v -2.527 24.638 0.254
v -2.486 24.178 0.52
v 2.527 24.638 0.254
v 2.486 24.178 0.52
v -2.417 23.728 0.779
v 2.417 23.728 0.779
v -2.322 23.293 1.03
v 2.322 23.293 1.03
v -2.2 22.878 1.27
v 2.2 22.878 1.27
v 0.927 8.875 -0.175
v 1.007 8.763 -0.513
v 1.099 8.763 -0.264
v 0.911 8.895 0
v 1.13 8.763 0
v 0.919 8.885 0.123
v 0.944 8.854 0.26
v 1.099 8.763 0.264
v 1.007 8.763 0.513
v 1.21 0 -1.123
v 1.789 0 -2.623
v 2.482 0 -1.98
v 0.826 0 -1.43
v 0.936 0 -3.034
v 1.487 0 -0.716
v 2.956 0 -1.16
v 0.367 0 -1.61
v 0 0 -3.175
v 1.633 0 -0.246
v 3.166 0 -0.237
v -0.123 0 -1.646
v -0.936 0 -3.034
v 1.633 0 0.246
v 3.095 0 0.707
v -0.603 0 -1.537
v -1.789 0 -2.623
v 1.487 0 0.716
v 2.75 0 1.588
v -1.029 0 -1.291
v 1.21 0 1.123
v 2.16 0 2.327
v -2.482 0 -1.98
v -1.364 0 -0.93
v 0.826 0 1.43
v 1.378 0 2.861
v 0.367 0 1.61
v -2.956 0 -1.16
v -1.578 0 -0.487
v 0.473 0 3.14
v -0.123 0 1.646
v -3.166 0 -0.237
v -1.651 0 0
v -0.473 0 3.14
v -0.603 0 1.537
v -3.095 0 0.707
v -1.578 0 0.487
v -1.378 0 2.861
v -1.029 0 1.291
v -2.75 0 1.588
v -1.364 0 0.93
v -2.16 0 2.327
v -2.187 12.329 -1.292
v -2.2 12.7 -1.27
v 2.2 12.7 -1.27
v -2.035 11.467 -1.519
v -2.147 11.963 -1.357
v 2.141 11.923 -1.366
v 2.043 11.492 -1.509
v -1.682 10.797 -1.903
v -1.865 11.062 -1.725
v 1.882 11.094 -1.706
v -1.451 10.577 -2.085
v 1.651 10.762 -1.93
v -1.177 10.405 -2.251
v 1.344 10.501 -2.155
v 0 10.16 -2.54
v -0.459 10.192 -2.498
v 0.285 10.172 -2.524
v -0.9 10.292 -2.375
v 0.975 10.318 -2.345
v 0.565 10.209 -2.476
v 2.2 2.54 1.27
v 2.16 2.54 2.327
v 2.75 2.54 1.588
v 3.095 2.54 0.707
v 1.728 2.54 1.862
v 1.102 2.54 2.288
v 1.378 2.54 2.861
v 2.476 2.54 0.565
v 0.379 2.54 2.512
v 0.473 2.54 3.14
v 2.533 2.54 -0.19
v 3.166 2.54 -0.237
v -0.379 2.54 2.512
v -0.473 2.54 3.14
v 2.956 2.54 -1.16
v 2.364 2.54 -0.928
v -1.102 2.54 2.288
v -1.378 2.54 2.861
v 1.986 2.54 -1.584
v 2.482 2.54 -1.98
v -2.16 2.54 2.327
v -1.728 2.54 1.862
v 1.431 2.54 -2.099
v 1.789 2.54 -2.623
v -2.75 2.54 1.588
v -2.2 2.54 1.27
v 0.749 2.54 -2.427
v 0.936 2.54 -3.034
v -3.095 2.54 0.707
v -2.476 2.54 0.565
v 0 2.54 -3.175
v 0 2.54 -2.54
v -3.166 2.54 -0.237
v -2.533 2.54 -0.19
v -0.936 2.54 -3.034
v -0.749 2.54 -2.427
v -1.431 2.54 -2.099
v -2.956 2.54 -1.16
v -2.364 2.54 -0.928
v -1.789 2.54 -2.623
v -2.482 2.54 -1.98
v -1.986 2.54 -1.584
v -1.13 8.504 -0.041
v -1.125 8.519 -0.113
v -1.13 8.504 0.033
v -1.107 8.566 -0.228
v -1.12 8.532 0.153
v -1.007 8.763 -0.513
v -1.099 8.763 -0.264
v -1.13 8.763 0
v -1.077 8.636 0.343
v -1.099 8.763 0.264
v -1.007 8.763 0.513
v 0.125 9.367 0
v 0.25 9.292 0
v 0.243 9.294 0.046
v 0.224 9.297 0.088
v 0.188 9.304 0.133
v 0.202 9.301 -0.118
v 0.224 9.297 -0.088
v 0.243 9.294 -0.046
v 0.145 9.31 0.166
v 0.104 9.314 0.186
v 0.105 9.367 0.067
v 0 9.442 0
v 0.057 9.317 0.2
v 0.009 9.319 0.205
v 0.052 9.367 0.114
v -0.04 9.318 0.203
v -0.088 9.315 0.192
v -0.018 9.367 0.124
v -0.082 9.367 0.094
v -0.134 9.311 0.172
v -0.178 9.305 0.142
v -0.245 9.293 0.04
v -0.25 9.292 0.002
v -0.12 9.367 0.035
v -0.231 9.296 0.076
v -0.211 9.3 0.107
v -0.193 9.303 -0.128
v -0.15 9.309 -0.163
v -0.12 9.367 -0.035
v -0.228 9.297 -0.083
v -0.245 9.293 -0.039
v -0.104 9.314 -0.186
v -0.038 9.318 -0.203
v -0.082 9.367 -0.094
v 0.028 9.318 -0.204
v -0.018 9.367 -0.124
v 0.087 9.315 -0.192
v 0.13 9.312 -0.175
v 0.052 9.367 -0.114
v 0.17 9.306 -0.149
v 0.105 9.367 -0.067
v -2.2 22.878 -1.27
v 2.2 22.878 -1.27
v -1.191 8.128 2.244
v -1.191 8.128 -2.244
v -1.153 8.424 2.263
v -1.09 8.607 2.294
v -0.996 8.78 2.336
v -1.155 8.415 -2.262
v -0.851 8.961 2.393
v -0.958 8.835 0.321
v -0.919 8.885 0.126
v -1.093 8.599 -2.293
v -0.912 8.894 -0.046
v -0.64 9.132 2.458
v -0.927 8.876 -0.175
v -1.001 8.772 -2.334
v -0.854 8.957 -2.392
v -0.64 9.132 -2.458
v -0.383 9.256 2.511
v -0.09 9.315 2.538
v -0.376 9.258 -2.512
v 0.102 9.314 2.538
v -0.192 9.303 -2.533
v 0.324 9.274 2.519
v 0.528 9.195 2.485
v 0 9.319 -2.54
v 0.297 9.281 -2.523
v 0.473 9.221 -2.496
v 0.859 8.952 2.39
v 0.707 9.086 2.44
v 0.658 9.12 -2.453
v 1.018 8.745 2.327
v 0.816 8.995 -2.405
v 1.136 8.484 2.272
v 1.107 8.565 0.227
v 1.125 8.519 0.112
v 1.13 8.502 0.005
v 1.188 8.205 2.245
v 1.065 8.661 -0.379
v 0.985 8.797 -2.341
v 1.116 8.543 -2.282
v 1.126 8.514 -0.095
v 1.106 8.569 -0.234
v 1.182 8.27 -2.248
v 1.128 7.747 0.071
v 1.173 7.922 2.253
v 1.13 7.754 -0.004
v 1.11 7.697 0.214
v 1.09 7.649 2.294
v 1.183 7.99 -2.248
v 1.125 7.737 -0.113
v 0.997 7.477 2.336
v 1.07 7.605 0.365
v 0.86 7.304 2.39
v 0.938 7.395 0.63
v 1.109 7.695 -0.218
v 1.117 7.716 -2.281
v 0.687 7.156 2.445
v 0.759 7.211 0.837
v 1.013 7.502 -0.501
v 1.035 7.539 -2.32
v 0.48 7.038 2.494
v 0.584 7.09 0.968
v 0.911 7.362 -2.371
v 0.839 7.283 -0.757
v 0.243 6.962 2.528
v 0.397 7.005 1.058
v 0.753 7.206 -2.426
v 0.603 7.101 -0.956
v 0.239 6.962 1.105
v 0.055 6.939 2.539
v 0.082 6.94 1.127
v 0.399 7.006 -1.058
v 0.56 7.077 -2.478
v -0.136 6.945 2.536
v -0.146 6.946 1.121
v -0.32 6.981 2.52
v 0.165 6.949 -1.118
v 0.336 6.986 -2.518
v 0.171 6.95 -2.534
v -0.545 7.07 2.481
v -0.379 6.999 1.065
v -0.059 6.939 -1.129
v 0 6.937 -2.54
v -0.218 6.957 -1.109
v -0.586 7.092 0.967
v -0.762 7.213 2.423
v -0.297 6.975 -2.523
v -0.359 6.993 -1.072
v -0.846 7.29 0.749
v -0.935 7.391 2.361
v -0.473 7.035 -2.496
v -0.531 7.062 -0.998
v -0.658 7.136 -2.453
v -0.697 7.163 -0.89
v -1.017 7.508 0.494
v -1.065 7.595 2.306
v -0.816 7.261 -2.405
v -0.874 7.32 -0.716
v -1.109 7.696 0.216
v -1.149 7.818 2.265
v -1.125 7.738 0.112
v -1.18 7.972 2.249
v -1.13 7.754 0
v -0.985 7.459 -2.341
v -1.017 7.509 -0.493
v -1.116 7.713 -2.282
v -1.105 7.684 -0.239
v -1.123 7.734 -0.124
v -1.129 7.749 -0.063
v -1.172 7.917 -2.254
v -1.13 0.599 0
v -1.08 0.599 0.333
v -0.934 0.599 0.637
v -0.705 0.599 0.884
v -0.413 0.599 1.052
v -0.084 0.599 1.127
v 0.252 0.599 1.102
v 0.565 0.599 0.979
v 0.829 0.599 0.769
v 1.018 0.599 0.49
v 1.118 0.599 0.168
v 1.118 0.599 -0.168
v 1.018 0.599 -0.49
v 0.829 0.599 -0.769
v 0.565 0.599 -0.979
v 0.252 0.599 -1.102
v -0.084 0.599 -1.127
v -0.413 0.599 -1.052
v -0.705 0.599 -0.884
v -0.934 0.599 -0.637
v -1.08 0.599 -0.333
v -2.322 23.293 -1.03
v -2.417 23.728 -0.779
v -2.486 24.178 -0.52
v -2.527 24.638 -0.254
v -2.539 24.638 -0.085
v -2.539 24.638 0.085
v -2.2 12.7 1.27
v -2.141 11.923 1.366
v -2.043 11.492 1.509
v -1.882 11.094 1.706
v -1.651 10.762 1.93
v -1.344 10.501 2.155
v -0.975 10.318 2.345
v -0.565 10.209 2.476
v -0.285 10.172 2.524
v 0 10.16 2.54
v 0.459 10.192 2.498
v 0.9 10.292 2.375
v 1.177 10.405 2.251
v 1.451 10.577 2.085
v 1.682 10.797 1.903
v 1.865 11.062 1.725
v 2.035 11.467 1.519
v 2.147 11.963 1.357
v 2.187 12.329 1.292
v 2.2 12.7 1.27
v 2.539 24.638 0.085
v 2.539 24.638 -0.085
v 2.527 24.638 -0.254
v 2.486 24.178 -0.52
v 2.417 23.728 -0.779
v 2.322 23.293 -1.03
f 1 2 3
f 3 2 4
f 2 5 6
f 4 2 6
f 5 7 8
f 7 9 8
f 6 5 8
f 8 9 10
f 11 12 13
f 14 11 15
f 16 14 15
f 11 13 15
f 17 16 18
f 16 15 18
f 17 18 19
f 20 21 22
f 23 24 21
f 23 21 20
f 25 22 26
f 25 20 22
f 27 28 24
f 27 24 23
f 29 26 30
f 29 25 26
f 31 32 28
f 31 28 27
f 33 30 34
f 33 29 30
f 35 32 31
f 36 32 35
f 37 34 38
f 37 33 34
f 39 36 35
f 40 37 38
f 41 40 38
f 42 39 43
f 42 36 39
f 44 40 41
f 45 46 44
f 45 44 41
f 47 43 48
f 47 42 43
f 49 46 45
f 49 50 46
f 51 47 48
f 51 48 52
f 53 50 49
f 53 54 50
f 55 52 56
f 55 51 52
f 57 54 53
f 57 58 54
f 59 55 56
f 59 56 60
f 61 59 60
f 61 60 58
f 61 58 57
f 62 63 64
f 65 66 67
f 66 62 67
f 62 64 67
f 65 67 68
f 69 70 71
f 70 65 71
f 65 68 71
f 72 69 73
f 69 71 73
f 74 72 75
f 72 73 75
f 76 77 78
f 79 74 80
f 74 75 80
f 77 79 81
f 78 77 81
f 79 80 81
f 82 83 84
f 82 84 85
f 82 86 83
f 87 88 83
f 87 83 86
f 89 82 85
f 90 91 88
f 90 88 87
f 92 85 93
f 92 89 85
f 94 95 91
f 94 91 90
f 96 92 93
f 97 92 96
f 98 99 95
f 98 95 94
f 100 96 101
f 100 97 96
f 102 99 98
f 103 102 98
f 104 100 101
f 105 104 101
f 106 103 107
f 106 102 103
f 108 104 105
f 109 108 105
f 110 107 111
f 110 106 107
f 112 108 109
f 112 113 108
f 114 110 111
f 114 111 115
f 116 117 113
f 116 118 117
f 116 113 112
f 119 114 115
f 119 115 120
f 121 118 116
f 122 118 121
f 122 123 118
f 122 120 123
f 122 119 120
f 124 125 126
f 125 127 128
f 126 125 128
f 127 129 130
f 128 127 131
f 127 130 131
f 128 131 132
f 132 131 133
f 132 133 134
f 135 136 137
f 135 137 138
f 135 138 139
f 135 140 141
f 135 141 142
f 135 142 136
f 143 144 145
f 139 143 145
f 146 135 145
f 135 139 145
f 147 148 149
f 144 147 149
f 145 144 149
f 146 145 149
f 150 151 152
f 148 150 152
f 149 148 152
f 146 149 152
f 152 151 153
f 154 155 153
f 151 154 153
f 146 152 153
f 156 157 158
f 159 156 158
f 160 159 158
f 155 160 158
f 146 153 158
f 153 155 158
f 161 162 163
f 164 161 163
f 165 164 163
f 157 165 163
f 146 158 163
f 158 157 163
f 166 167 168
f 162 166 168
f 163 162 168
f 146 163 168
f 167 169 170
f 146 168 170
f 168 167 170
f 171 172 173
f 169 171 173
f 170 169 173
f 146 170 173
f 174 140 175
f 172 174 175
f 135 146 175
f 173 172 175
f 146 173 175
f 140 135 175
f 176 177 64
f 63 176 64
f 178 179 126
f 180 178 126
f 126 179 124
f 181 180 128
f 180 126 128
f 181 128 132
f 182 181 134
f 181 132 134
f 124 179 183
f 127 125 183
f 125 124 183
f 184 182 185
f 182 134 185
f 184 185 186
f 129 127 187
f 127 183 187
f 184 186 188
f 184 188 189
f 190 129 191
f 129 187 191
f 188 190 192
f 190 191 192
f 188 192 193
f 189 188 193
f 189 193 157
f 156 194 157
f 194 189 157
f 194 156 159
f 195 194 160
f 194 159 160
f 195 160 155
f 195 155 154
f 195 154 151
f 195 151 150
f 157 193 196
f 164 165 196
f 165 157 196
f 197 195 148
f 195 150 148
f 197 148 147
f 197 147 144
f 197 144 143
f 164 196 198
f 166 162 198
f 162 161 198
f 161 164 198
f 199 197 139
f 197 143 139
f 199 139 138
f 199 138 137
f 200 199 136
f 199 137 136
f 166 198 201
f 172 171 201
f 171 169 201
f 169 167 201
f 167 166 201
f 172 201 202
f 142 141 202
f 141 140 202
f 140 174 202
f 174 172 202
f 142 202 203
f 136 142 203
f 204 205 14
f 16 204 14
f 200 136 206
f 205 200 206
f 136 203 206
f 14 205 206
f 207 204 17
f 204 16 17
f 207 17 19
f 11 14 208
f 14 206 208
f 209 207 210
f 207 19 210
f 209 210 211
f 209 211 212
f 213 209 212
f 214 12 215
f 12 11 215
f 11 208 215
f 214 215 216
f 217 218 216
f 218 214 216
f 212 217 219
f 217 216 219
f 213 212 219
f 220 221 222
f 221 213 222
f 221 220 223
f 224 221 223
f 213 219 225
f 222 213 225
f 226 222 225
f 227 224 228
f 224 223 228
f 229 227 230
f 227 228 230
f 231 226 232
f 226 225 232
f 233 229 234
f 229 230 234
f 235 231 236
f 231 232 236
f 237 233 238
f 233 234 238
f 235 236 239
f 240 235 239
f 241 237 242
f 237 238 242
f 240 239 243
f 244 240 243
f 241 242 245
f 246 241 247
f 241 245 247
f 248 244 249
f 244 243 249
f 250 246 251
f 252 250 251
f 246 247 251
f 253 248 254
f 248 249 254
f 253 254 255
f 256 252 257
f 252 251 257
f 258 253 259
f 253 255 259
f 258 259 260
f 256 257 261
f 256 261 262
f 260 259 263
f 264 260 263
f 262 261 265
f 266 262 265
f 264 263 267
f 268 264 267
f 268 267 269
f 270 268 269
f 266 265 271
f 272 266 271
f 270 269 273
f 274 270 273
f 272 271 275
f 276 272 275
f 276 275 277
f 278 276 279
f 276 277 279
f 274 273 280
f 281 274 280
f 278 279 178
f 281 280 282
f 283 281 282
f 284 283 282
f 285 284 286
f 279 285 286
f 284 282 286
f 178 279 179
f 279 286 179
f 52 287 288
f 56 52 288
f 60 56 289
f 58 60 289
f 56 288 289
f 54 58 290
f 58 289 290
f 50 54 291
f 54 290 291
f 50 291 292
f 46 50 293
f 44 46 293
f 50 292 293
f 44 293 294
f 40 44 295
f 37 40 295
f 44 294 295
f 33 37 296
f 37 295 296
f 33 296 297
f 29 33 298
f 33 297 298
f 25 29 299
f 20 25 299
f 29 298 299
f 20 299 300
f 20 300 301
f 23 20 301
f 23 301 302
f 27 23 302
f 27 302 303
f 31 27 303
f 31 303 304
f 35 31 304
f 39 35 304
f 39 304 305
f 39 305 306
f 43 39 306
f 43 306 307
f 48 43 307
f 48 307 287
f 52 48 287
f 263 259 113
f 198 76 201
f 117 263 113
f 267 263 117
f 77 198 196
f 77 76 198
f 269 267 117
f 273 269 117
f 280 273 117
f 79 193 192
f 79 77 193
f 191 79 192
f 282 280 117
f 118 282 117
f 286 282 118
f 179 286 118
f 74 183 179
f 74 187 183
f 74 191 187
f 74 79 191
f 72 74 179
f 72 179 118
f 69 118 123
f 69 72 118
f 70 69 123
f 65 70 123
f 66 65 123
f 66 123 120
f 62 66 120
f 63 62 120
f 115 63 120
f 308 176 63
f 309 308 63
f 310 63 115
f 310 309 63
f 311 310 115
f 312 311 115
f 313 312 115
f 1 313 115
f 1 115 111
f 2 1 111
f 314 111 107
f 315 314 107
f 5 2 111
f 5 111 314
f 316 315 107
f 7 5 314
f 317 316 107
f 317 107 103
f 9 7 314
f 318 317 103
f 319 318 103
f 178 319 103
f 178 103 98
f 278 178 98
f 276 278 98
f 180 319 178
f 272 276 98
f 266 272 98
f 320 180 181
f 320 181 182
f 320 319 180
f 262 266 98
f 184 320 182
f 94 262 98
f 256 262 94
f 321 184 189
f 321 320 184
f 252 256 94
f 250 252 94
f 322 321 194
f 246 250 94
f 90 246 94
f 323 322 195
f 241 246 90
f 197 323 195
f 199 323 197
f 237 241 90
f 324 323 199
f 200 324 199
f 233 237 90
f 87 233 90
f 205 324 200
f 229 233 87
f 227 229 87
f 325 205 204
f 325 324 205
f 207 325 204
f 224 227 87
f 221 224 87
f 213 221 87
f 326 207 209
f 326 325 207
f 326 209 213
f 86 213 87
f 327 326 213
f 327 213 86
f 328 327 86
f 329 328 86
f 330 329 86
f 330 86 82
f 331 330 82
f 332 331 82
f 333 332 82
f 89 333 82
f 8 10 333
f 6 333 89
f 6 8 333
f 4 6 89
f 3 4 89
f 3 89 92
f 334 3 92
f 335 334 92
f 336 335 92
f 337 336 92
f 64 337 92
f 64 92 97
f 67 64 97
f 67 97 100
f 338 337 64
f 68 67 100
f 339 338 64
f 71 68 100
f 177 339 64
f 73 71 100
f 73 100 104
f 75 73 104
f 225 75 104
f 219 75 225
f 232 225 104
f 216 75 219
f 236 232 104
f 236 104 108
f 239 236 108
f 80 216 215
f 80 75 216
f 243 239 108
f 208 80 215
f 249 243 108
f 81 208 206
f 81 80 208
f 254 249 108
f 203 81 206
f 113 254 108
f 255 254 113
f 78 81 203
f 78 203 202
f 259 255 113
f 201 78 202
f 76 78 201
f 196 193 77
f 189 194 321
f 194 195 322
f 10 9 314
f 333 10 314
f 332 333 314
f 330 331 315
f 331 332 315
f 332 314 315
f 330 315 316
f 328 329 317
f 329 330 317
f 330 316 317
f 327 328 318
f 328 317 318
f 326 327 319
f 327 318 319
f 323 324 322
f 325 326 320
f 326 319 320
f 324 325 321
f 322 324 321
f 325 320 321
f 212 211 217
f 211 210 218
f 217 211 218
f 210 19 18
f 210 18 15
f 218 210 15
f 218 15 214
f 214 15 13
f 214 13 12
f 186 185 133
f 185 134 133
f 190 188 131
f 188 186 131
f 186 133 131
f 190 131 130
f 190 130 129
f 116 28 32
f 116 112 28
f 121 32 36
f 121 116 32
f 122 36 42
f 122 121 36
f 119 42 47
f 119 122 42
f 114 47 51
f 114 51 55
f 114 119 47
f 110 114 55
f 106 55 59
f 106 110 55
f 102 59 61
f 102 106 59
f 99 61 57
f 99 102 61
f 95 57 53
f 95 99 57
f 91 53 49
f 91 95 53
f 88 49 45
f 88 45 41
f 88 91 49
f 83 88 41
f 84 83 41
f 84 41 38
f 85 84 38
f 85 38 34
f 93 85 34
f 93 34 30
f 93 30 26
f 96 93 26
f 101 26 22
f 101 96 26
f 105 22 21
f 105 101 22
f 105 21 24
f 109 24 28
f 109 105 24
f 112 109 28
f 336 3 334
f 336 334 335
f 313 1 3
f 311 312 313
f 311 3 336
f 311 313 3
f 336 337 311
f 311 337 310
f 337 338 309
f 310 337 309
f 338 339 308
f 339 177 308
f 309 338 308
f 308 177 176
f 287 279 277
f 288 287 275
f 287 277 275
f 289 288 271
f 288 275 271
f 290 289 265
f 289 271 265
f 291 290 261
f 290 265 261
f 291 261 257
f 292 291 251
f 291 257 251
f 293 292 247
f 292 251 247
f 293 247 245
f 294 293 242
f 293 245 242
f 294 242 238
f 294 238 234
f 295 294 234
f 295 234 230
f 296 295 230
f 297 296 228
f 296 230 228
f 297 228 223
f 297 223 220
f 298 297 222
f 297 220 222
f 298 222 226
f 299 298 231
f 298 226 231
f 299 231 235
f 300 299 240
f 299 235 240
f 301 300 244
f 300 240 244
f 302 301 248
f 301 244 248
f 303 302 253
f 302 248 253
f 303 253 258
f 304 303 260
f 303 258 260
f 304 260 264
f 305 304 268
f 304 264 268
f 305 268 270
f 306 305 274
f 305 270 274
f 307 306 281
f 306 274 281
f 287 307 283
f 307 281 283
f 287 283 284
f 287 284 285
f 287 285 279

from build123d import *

# Parameters (mm, degrees)
F_4_40_TAPPED_HOLE1_D           = 2.2606
F_4_40_TAPPED_HOLE1_DEPTH       = 8.763
F_4_40_TAPPED_HOLE1_CSINK_D     = 3.302
F_4_40_TAPPED_HOLE1_CSINK_ANGLE = 82
F_4_40_TAPPED_HOLE1_TIP         = 0.679152758
F_3_32_0_09375_DIAMETER_HOLE1_D = 2.38125
CUT_EXTRUDE1_DEPTH              = 26.043807596
CIRPATTERN1_COUNT               = 2
CHAMFER1_SIZE                   = 1.016
CHAMFER1_SIZE2                  = 1.75976362


with BuildPart() as part:
    # Sketch1 → Revolve1 (revolve)
    with BuildSketch(Plane.XY, mode=Mode.PRIVATE) as revolve1_sk:
        Polygon((0, 0), (3.175, 0), (3.175, 2.54), (2.54, 2.54), (2.54, 24.638), (0, 24.638), align=None)
    revolve(revolve1_sk.sketch.rotate(Axis((0, 0, 0), (0, 1, 0)), 90), axis=Axis((0, 0, 0), (0, 1, 0)))

    # 4-40 Tapped Hole1
    with Locations(Plane.XZ):
        with Locations((0, 0)):
            CounterSinkHole(F_4_40_TAPPED_HOLE1_D / 2, F_4_40_TAPPED_HOLE1_CSINK_D / 2, depth=F_4_40_TAPPED_HOLE1_DEPTH, counter_sink_angle=F_4_40_TAPPED_HOLE1_CSINK_ANGLE)
            with Locations((0, 0, -(F_4_40_TAPPED_HOLE1_DEPTH + F_4_40_TAPPED_HOLE1_TIP / 2))):  # 118° drill point
                Cone(0, F_4_40_TAPPED_HOLE1_D / 2, F_4_40_TAPPED_HOLE1_TIP, mode=Mode.SUBTRACT)

    # 3_32 _0.09375_ Diameter Hole1 (through all)
    with Locations(Plane.XY.offset(2.54)):
        with Locations((0, 8.128)):
            Hole(F_3_32_0_09375_DIAMETER_HOLE1_D / 2)

    # Sketch6 → Cut-Extrude1 (cut, symmetric)
    with BuildSketch(Plane(origin=(0, 0, 0), x_dir=(0, 0, -1), z_dir=(1, 0, 0))):
        with BuildLine():
            Line((1.27, 24.638), (1.27, 12.7))
            ThreePointArc((1.27, 12.7), (1.605193669, 11.280096834), (2.54, 10.16))
            Line((2.54, 10.16), (2.54, 24.638))
            Line((2.54, 24.638), (1.27, 24.638))
        make_face()
    cut_extrude1 = extrude(amount=CUT_EXTRUDE1_DEPTH, both=True, mode=Mode.SUBTRACT)

    # CirPattern1: Cut-Extrude1 ×2 about axis
    cirpattern1_axis = Axis((0, -1.2319, 0), (0, 1, 0))
    for i in range(1, CIRPATTERN1_COUNT):
        add(cut_extrude1.rotate(cirpattern1_axis, i * 360 / CIRPATTERN1_COUNT), mode=Mode.SUBTRACT)

    # Chamfer1
    chamfer1_edges = [part.edges().sort_by_distance(p)[0] for p in [
        (0, 24.638, -1.27),
        (0, 24.638, 1.27),
    ]]
    chamfer1_side = [part.faces().sort_by_distance(p)[0] for p in [
        (0, 24.638, 0),
    ]]
    chamfer(chamfer1_edges, length=CHAMFER1_SIZE, length2=CHAMFER1_SIZE2, reference=chamfer1_side[0])


solid = part.part
